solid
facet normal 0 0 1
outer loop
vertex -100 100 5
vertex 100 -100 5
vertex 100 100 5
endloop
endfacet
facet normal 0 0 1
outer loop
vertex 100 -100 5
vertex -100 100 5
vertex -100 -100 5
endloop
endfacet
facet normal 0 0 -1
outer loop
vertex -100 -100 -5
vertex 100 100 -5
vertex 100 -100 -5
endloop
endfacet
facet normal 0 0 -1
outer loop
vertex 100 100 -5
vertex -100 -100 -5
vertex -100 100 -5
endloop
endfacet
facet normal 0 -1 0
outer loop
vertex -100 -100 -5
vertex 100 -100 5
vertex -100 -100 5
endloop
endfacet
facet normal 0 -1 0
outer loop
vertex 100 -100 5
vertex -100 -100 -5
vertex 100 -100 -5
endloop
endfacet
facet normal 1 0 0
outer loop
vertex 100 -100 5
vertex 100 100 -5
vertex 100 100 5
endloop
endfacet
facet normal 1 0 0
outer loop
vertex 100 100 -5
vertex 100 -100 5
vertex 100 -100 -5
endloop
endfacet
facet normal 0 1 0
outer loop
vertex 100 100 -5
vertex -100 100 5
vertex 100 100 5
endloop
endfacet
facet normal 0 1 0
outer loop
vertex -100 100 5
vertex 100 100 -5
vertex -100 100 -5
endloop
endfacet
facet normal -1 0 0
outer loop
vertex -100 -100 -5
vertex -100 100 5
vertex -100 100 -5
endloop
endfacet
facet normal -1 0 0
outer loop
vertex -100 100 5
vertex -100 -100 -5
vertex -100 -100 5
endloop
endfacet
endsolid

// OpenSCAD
$fn = 64;

length = 200;
width  = 200;
thickness = 10;

// Centered solid sheet so it renders clearly in all views
cube([length, width, thickness], center=true);
